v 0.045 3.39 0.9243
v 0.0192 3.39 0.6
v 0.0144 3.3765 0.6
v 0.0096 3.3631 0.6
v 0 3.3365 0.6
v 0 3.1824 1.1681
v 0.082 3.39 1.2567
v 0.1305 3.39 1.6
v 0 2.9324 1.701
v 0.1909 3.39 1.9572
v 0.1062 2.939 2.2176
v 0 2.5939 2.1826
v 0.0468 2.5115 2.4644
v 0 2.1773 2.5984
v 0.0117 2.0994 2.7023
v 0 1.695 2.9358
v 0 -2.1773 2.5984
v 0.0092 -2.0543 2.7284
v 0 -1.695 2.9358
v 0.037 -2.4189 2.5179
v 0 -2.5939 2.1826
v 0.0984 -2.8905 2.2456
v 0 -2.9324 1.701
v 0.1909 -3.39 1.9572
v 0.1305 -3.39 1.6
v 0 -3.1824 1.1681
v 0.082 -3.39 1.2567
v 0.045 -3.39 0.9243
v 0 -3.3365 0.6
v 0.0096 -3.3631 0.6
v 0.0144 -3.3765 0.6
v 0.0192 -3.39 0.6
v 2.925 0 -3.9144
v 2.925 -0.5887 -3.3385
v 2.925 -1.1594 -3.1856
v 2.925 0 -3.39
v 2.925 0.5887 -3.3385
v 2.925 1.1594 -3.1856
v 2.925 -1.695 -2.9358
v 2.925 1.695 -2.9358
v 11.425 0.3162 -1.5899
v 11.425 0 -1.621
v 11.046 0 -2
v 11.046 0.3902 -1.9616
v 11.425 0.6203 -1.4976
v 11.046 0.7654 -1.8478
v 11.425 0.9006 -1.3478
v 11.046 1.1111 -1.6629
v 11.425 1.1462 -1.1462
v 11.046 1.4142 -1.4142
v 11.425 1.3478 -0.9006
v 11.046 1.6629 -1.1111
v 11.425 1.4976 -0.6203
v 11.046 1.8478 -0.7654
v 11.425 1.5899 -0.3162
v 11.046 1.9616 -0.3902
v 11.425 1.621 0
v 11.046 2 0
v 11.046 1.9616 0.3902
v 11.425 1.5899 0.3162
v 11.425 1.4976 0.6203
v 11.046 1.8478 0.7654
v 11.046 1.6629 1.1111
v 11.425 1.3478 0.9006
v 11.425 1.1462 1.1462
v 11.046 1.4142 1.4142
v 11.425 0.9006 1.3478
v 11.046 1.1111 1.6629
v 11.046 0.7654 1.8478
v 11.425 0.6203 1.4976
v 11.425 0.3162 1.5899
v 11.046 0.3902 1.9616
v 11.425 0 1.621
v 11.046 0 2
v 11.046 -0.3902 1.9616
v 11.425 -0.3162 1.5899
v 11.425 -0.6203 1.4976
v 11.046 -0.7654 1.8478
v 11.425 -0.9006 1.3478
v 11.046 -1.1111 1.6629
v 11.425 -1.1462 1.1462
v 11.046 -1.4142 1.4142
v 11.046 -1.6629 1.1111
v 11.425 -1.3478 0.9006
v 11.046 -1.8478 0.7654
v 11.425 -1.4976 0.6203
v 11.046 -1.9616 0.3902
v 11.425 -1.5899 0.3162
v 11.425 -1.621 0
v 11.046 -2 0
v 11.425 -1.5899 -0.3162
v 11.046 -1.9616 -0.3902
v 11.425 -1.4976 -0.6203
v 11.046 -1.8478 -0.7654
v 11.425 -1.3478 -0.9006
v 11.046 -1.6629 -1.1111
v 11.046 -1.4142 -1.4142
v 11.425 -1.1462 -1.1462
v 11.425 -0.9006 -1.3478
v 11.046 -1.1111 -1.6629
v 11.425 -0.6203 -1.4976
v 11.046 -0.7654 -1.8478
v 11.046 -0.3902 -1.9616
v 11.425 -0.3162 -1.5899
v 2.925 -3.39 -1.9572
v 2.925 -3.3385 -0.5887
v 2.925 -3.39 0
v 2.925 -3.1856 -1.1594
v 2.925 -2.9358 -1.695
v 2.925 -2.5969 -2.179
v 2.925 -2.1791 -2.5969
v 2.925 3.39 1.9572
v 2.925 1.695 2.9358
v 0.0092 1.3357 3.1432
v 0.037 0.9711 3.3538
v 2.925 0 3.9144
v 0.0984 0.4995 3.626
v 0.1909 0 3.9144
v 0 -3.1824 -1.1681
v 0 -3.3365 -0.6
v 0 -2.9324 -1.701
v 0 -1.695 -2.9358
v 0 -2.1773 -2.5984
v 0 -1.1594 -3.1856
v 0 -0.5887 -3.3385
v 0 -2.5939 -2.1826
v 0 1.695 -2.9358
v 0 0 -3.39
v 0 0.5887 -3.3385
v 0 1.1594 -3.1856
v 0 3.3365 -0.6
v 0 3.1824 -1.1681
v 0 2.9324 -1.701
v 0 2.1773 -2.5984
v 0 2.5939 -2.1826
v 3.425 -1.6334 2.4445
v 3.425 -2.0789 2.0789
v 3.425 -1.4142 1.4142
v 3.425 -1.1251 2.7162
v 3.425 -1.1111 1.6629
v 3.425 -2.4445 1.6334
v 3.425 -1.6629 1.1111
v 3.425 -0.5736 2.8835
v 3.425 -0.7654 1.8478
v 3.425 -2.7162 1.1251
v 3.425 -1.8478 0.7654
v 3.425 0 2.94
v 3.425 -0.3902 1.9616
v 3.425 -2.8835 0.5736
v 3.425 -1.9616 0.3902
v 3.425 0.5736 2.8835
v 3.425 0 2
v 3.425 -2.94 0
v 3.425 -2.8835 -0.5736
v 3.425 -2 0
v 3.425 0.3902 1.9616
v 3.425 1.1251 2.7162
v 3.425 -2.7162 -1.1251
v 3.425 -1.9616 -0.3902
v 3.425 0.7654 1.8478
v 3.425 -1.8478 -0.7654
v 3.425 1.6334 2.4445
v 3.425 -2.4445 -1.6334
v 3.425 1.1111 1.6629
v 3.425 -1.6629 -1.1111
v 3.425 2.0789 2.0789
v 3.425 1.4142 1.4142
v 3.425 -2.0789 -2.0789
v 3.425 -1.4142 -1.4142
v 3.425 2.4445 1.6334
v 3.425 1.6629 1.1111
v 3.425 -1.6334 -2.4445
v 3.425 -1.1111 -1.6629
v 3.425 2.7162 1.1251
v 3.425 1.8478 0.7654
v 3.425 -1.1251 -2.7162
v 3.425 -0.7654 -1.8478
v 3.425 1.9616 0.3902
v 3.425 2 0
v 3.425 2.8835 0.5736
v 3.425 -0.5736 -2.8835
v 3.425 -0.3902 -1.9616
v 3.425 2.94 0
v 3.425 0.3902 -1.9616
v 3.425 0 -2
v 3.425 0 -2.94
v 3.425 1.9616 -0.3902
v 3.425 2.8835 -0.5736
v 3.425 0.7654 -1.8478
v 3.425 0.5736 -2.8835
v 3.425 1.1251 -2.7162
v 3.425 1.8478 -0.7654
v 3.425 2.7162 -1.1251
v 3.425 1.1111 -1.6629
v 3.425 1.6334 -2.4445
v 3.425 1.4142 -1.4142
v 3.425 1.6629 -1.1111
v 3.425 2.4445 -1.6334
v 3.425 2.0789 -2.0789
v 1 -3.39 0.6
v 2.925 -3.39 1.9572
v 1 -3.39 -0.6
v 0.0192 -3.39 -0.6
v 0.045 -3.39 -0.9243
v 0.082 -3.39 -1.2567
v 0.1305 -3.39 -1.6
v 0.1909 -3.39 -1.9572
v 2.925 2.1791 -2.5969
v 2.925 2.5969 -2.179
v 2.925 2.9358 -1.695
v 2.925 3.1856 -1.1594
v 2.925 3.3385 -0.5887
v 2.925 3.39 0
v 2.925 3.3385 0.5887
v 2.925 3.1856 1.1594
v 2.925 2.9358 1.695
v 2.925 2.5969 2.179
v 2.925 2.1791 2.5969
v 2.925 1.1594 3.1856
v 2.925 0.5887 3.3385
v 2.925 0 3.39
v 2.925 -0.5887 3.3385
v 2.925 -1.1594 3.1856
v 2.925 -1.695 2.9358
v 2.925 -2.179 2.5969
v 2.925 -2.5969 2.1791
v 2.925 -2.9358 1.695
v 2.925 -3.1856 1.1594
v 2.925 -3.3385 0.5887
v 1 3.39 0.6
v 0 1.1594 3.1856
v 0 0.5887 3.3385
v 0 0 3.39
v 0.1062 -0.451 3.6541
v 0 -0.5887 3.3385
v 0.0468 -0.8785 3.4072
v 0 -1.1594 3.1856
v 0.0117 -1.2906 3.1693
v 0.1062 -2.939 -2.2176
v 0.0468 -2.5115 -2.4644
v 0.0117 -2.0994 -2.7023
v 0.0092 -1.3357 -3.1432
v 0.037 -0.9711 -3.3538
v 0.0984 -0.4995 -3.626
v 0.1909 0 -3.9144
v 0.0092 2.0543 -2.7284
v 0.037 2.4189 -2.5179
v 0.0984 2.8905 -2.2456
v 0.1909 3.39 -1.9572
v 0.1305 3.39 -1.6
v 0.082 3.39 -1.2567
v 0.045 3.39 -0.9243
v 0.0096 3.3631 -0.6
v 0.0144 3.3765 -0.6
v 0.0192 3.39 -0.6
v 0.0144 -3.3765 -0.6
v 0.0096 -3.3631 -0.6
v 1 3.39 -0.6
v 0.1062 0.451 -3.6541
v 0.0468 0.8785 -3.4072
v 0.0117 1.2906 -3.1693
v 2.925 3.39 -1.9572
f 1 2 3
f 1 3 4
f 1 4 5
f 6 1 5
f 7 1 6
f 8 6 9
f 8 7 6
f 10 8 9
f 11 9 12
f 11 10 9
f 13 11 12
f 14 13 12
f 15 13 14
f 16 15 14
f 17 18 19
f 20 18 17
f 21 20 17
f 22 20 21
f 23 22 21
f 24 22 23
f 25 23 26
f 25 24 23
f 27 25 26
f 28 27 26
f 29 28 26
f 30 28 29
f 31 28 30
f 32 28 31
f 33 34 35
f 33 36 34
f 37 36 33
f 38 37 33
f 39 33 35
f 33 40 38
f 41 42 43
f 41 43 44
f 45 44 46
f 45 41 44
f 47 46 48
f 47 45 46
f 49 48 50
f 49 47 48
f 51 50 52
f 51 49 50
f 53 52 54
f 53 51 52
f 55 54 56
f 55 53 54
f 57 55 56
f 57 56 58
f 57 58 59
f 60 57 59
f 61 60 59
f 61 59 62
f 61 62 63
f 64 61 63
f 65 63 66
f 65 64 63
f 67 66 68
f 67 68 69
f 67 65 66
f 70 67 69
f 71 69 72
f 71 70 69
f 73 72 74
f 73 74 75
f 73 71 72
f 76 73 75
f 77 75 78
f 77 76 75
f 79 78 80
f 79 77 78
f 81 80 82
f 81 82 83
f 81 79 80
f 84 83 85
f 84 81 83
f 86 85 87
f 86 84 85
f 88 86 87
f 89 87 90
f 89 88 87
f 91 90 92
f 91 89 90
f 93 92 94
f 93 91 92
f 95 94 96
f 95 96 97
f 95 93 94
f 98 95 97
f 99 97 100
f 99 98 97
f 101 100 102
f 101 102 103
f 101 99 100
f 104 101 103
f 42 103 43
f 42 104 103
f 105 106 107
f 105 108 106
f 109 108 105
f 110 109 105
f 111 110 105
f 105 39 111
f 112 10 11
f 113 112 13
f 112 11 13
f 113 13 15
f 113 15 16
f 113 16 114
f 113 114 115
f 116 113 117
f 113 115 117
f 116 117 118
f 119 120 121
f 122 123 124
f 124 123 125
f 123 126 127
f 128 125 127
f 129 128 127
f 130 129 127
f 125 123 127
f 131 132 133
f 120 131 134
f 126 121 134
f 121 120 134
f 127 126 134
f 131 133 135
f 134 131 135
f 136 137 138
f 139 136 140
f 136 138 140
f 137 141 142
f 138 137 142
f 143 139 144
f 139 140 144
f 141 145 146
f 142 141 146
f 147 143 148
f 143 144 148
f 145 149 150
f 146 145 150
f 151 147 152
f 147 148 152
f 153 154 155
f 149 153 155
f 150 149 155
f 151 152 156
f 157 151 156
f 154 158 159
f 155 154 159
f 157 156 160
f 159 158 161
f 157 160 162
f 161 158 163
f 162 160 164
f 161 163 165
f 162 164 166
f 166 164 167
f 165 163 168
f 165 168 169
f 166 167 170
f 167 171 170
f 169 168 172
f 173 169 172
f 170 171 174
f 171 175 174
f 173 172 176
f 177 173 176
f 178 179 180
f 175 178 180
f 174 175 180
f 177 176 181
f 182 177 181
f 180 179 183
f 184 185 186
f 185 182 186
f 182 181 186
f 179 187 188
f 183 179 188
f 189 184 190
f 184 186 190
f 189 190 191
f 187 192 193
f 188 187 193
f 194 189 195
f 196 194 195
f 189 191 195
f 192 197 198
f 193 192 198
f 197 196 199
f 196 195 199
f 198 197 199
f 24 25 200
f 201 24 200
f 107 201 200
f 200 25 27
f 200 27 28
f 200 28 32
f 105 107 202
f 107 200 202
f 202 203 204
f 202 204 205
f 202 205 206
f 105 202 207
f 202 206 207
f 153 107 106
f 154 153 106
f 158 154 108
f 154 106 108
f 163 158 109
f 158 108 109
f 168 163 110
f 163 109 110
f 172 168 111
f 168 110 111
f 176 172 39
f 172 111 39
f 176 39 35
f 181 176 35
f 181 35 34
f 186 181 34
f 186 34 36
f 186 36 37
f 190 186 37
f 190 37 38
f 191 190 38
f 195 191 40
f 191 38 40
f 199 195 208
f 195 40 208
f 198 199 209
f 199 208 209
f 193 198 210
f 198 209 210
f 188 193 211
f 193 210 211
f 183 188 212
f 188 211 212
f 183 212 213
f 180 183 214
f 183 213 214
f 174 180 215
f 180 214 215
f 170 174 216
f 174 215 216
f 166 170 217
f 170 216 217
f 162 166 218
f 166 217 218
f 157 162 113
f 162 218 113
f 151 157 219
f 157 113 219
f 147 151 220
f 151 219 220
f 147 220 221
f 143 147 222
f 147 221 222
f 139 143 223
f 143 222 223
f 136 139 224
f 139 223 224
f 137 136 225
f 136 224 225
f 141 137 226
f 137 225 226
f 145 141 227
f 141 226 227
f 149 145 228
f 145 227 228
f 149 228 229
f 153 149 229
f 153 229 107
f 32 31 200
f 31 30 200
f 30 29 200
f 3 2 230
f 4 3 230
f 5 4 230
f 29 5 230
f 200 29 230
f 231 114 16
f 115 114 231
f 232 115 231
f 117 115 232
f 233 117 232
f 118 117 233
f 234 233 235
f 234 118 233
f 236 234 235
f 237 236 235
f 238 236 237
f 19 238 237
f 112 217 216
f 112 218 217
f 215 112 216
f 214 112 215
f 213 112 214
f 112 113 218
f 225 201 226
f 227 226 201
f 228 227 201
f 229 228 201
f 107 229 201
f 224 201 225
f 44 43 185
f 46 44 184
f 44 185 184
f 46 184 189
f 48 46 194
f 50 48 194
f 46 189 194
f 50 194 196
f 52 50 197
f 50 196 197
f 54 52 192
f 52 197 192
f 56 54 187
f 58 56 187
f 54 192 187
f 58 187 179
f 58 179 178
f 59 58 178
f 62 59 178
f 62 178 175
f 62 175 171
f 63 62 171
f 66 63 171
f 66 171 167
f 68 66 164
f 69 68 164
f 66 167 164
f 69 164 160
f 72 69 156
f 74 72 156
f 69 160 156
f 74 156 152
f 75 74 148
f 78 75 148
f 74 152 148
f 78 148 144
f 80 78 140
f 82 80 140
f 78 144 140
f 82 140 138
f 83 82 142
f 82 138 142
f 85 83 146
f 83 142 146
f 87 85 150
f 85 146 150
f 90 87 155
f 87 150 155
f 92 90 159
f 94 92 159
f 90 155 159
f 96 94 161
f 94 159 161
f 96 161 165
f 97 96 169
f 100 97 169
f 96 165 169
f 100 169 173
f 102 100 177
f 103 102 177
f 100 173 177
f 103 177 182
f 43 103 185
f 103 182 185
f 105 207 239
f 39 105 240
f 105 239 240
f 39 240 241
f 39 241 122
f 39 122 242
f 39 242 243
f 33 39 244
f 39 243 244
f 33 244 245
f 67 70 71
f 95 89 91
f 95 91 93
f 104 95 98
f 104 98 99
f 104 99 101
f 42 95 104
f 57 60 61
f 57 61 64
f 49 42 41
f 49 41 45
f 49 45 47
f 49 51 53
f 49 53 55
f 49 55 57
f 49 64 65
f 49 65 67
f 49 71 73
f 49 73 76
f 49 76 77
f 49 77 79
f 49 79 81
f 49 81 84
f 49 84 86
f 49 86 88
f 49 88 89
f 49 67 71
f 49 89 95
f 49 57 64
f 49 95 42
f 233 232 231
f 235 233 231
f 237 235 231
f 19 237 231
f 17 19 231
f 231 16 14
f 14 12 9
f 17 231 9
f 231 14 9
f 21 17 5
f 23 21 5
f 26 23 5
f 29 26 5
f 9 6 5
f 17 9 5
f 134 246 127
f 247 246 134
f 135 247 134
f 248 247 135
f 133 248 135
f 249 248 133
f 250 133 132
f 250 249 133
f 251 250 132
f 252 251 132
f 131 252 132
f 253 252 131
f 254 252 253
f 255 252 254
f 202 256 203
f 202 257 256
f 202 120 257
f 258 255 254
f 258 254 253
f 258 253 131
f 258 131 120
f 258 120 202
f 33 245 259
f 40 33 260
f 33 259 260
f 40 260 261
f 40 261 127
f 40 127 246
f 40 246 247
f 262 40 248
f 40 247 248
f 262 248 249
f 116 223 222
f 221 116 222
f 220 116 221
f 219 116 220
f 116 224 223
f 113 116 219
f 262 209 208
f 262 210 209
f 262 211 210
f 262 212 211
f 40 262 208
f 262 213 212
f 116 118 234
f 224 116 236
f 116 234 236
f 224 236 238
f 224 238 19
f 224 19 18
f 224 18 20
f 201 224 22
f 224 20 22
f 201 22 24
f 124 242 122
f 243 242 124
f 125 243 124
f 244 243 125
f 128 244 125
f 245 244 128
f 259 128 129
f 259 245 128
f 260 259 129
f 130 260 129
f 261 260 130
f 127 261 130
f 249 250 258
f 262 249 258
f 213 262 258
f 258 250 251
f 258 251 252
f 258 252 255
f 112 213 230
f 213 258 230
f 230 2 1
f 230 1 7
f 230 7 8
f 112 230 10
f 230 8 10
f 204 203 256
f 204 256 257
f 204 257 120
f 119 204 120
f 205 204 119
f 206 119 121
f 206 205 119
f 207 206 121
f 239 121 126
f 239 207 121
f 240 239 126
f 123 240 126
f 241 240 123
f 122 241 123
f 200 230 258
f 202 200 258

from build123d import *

# Parameters (mm, degrees)
BASEHEAD_DEPTH  = 2.925
SKETCH3_R       = 2
BASEBODY_DEPTH  = 8
CHAMFER1_SIZE   = 0.379
SKETCH5_W       = 1
SKETCH5_H       = 1.2
SLOT_DEPTH      = 4.39
SLOT_DEPTH_BACK = 4.39


with BuildPart() as part:
    # Sketch-BaseHead → BaseHead (new body)
    with BuildSketch(Plane(origin=(0, 0, 0), x_dir=(0, 0, -1), z_dir=(1, 0, 0))):
        Polygon((1.957217413, -3.39), (3.914434825, 0), (1.957217413, 3.39), (-1.957217413, 3.39), (-3.914434825, 0), (-1.957217413, -3.39), align=None)
    extrude(amount=BASEHEAD_DEPTH)

    # Sketch1 → Revolve1 (revolve)
    with BuildSketch(Plane.XY):
        Polygon((2.925, 0), (3.425, 0), (3.425, -2.94), (2.925, -3.39), align=None)
    revolve(axis=Axis((-4.001564945, 0, 0), (1, 0, 0)))

    # Sketch3 → BaseBody (add)
    with BuildSketch(Plane(origin=(3.425, 0, 0), x_dir=(0, 0, -1), z_dir=(1, 0, 0))):
        Circle(SKETCH3_R)
    extrude(amount=BASEBODY_DEPTH)

    # Chamfer1
    chamfer1_edges = [part.edges().sort_by_distance(p)[0] for p in [
        (11.425, 0, 2),
    ]]
    chamfer(chamfer1_edges, length=CHAMFER1_SIZE)

    # Sketch4 → HeadChamfer (revolve, cut)
    with BuildSketch(Plane(origin=(-0.264637255, 0, 5.916896391), x_dir=(0, 0, -1), z_dir=(0, 1, 0))):
        Polygon((9.831331216, -0.264637255), (9.306896391, -0.264637255), (9.831331216, -0.455515922), align=None)
    revolve(axis=Axis((-4.001564945, 0, 0), (1, 0, 0)), mode=Mode.SUBTRACT)

    # Sketch5 → Slot (cut, two sides)
    with BuildSketch(Plane(origin=(0, 0, 0), x_dir=(1, 0, 0), z_dir=(0, 1, 0))) as slot_sk:
        with Locations((0.5, 0)):
            Rectangle(SKETCH5_W, SKETCH5_H)
    extrude(amount=SLOT_DEPTH, mode=Mode.SUBTRACT)
    extrude(slot_sk.sketch, amount=-SLOT_DEPTH_BACK, mode=Mode.SUBTRACT)


solid = part.part
